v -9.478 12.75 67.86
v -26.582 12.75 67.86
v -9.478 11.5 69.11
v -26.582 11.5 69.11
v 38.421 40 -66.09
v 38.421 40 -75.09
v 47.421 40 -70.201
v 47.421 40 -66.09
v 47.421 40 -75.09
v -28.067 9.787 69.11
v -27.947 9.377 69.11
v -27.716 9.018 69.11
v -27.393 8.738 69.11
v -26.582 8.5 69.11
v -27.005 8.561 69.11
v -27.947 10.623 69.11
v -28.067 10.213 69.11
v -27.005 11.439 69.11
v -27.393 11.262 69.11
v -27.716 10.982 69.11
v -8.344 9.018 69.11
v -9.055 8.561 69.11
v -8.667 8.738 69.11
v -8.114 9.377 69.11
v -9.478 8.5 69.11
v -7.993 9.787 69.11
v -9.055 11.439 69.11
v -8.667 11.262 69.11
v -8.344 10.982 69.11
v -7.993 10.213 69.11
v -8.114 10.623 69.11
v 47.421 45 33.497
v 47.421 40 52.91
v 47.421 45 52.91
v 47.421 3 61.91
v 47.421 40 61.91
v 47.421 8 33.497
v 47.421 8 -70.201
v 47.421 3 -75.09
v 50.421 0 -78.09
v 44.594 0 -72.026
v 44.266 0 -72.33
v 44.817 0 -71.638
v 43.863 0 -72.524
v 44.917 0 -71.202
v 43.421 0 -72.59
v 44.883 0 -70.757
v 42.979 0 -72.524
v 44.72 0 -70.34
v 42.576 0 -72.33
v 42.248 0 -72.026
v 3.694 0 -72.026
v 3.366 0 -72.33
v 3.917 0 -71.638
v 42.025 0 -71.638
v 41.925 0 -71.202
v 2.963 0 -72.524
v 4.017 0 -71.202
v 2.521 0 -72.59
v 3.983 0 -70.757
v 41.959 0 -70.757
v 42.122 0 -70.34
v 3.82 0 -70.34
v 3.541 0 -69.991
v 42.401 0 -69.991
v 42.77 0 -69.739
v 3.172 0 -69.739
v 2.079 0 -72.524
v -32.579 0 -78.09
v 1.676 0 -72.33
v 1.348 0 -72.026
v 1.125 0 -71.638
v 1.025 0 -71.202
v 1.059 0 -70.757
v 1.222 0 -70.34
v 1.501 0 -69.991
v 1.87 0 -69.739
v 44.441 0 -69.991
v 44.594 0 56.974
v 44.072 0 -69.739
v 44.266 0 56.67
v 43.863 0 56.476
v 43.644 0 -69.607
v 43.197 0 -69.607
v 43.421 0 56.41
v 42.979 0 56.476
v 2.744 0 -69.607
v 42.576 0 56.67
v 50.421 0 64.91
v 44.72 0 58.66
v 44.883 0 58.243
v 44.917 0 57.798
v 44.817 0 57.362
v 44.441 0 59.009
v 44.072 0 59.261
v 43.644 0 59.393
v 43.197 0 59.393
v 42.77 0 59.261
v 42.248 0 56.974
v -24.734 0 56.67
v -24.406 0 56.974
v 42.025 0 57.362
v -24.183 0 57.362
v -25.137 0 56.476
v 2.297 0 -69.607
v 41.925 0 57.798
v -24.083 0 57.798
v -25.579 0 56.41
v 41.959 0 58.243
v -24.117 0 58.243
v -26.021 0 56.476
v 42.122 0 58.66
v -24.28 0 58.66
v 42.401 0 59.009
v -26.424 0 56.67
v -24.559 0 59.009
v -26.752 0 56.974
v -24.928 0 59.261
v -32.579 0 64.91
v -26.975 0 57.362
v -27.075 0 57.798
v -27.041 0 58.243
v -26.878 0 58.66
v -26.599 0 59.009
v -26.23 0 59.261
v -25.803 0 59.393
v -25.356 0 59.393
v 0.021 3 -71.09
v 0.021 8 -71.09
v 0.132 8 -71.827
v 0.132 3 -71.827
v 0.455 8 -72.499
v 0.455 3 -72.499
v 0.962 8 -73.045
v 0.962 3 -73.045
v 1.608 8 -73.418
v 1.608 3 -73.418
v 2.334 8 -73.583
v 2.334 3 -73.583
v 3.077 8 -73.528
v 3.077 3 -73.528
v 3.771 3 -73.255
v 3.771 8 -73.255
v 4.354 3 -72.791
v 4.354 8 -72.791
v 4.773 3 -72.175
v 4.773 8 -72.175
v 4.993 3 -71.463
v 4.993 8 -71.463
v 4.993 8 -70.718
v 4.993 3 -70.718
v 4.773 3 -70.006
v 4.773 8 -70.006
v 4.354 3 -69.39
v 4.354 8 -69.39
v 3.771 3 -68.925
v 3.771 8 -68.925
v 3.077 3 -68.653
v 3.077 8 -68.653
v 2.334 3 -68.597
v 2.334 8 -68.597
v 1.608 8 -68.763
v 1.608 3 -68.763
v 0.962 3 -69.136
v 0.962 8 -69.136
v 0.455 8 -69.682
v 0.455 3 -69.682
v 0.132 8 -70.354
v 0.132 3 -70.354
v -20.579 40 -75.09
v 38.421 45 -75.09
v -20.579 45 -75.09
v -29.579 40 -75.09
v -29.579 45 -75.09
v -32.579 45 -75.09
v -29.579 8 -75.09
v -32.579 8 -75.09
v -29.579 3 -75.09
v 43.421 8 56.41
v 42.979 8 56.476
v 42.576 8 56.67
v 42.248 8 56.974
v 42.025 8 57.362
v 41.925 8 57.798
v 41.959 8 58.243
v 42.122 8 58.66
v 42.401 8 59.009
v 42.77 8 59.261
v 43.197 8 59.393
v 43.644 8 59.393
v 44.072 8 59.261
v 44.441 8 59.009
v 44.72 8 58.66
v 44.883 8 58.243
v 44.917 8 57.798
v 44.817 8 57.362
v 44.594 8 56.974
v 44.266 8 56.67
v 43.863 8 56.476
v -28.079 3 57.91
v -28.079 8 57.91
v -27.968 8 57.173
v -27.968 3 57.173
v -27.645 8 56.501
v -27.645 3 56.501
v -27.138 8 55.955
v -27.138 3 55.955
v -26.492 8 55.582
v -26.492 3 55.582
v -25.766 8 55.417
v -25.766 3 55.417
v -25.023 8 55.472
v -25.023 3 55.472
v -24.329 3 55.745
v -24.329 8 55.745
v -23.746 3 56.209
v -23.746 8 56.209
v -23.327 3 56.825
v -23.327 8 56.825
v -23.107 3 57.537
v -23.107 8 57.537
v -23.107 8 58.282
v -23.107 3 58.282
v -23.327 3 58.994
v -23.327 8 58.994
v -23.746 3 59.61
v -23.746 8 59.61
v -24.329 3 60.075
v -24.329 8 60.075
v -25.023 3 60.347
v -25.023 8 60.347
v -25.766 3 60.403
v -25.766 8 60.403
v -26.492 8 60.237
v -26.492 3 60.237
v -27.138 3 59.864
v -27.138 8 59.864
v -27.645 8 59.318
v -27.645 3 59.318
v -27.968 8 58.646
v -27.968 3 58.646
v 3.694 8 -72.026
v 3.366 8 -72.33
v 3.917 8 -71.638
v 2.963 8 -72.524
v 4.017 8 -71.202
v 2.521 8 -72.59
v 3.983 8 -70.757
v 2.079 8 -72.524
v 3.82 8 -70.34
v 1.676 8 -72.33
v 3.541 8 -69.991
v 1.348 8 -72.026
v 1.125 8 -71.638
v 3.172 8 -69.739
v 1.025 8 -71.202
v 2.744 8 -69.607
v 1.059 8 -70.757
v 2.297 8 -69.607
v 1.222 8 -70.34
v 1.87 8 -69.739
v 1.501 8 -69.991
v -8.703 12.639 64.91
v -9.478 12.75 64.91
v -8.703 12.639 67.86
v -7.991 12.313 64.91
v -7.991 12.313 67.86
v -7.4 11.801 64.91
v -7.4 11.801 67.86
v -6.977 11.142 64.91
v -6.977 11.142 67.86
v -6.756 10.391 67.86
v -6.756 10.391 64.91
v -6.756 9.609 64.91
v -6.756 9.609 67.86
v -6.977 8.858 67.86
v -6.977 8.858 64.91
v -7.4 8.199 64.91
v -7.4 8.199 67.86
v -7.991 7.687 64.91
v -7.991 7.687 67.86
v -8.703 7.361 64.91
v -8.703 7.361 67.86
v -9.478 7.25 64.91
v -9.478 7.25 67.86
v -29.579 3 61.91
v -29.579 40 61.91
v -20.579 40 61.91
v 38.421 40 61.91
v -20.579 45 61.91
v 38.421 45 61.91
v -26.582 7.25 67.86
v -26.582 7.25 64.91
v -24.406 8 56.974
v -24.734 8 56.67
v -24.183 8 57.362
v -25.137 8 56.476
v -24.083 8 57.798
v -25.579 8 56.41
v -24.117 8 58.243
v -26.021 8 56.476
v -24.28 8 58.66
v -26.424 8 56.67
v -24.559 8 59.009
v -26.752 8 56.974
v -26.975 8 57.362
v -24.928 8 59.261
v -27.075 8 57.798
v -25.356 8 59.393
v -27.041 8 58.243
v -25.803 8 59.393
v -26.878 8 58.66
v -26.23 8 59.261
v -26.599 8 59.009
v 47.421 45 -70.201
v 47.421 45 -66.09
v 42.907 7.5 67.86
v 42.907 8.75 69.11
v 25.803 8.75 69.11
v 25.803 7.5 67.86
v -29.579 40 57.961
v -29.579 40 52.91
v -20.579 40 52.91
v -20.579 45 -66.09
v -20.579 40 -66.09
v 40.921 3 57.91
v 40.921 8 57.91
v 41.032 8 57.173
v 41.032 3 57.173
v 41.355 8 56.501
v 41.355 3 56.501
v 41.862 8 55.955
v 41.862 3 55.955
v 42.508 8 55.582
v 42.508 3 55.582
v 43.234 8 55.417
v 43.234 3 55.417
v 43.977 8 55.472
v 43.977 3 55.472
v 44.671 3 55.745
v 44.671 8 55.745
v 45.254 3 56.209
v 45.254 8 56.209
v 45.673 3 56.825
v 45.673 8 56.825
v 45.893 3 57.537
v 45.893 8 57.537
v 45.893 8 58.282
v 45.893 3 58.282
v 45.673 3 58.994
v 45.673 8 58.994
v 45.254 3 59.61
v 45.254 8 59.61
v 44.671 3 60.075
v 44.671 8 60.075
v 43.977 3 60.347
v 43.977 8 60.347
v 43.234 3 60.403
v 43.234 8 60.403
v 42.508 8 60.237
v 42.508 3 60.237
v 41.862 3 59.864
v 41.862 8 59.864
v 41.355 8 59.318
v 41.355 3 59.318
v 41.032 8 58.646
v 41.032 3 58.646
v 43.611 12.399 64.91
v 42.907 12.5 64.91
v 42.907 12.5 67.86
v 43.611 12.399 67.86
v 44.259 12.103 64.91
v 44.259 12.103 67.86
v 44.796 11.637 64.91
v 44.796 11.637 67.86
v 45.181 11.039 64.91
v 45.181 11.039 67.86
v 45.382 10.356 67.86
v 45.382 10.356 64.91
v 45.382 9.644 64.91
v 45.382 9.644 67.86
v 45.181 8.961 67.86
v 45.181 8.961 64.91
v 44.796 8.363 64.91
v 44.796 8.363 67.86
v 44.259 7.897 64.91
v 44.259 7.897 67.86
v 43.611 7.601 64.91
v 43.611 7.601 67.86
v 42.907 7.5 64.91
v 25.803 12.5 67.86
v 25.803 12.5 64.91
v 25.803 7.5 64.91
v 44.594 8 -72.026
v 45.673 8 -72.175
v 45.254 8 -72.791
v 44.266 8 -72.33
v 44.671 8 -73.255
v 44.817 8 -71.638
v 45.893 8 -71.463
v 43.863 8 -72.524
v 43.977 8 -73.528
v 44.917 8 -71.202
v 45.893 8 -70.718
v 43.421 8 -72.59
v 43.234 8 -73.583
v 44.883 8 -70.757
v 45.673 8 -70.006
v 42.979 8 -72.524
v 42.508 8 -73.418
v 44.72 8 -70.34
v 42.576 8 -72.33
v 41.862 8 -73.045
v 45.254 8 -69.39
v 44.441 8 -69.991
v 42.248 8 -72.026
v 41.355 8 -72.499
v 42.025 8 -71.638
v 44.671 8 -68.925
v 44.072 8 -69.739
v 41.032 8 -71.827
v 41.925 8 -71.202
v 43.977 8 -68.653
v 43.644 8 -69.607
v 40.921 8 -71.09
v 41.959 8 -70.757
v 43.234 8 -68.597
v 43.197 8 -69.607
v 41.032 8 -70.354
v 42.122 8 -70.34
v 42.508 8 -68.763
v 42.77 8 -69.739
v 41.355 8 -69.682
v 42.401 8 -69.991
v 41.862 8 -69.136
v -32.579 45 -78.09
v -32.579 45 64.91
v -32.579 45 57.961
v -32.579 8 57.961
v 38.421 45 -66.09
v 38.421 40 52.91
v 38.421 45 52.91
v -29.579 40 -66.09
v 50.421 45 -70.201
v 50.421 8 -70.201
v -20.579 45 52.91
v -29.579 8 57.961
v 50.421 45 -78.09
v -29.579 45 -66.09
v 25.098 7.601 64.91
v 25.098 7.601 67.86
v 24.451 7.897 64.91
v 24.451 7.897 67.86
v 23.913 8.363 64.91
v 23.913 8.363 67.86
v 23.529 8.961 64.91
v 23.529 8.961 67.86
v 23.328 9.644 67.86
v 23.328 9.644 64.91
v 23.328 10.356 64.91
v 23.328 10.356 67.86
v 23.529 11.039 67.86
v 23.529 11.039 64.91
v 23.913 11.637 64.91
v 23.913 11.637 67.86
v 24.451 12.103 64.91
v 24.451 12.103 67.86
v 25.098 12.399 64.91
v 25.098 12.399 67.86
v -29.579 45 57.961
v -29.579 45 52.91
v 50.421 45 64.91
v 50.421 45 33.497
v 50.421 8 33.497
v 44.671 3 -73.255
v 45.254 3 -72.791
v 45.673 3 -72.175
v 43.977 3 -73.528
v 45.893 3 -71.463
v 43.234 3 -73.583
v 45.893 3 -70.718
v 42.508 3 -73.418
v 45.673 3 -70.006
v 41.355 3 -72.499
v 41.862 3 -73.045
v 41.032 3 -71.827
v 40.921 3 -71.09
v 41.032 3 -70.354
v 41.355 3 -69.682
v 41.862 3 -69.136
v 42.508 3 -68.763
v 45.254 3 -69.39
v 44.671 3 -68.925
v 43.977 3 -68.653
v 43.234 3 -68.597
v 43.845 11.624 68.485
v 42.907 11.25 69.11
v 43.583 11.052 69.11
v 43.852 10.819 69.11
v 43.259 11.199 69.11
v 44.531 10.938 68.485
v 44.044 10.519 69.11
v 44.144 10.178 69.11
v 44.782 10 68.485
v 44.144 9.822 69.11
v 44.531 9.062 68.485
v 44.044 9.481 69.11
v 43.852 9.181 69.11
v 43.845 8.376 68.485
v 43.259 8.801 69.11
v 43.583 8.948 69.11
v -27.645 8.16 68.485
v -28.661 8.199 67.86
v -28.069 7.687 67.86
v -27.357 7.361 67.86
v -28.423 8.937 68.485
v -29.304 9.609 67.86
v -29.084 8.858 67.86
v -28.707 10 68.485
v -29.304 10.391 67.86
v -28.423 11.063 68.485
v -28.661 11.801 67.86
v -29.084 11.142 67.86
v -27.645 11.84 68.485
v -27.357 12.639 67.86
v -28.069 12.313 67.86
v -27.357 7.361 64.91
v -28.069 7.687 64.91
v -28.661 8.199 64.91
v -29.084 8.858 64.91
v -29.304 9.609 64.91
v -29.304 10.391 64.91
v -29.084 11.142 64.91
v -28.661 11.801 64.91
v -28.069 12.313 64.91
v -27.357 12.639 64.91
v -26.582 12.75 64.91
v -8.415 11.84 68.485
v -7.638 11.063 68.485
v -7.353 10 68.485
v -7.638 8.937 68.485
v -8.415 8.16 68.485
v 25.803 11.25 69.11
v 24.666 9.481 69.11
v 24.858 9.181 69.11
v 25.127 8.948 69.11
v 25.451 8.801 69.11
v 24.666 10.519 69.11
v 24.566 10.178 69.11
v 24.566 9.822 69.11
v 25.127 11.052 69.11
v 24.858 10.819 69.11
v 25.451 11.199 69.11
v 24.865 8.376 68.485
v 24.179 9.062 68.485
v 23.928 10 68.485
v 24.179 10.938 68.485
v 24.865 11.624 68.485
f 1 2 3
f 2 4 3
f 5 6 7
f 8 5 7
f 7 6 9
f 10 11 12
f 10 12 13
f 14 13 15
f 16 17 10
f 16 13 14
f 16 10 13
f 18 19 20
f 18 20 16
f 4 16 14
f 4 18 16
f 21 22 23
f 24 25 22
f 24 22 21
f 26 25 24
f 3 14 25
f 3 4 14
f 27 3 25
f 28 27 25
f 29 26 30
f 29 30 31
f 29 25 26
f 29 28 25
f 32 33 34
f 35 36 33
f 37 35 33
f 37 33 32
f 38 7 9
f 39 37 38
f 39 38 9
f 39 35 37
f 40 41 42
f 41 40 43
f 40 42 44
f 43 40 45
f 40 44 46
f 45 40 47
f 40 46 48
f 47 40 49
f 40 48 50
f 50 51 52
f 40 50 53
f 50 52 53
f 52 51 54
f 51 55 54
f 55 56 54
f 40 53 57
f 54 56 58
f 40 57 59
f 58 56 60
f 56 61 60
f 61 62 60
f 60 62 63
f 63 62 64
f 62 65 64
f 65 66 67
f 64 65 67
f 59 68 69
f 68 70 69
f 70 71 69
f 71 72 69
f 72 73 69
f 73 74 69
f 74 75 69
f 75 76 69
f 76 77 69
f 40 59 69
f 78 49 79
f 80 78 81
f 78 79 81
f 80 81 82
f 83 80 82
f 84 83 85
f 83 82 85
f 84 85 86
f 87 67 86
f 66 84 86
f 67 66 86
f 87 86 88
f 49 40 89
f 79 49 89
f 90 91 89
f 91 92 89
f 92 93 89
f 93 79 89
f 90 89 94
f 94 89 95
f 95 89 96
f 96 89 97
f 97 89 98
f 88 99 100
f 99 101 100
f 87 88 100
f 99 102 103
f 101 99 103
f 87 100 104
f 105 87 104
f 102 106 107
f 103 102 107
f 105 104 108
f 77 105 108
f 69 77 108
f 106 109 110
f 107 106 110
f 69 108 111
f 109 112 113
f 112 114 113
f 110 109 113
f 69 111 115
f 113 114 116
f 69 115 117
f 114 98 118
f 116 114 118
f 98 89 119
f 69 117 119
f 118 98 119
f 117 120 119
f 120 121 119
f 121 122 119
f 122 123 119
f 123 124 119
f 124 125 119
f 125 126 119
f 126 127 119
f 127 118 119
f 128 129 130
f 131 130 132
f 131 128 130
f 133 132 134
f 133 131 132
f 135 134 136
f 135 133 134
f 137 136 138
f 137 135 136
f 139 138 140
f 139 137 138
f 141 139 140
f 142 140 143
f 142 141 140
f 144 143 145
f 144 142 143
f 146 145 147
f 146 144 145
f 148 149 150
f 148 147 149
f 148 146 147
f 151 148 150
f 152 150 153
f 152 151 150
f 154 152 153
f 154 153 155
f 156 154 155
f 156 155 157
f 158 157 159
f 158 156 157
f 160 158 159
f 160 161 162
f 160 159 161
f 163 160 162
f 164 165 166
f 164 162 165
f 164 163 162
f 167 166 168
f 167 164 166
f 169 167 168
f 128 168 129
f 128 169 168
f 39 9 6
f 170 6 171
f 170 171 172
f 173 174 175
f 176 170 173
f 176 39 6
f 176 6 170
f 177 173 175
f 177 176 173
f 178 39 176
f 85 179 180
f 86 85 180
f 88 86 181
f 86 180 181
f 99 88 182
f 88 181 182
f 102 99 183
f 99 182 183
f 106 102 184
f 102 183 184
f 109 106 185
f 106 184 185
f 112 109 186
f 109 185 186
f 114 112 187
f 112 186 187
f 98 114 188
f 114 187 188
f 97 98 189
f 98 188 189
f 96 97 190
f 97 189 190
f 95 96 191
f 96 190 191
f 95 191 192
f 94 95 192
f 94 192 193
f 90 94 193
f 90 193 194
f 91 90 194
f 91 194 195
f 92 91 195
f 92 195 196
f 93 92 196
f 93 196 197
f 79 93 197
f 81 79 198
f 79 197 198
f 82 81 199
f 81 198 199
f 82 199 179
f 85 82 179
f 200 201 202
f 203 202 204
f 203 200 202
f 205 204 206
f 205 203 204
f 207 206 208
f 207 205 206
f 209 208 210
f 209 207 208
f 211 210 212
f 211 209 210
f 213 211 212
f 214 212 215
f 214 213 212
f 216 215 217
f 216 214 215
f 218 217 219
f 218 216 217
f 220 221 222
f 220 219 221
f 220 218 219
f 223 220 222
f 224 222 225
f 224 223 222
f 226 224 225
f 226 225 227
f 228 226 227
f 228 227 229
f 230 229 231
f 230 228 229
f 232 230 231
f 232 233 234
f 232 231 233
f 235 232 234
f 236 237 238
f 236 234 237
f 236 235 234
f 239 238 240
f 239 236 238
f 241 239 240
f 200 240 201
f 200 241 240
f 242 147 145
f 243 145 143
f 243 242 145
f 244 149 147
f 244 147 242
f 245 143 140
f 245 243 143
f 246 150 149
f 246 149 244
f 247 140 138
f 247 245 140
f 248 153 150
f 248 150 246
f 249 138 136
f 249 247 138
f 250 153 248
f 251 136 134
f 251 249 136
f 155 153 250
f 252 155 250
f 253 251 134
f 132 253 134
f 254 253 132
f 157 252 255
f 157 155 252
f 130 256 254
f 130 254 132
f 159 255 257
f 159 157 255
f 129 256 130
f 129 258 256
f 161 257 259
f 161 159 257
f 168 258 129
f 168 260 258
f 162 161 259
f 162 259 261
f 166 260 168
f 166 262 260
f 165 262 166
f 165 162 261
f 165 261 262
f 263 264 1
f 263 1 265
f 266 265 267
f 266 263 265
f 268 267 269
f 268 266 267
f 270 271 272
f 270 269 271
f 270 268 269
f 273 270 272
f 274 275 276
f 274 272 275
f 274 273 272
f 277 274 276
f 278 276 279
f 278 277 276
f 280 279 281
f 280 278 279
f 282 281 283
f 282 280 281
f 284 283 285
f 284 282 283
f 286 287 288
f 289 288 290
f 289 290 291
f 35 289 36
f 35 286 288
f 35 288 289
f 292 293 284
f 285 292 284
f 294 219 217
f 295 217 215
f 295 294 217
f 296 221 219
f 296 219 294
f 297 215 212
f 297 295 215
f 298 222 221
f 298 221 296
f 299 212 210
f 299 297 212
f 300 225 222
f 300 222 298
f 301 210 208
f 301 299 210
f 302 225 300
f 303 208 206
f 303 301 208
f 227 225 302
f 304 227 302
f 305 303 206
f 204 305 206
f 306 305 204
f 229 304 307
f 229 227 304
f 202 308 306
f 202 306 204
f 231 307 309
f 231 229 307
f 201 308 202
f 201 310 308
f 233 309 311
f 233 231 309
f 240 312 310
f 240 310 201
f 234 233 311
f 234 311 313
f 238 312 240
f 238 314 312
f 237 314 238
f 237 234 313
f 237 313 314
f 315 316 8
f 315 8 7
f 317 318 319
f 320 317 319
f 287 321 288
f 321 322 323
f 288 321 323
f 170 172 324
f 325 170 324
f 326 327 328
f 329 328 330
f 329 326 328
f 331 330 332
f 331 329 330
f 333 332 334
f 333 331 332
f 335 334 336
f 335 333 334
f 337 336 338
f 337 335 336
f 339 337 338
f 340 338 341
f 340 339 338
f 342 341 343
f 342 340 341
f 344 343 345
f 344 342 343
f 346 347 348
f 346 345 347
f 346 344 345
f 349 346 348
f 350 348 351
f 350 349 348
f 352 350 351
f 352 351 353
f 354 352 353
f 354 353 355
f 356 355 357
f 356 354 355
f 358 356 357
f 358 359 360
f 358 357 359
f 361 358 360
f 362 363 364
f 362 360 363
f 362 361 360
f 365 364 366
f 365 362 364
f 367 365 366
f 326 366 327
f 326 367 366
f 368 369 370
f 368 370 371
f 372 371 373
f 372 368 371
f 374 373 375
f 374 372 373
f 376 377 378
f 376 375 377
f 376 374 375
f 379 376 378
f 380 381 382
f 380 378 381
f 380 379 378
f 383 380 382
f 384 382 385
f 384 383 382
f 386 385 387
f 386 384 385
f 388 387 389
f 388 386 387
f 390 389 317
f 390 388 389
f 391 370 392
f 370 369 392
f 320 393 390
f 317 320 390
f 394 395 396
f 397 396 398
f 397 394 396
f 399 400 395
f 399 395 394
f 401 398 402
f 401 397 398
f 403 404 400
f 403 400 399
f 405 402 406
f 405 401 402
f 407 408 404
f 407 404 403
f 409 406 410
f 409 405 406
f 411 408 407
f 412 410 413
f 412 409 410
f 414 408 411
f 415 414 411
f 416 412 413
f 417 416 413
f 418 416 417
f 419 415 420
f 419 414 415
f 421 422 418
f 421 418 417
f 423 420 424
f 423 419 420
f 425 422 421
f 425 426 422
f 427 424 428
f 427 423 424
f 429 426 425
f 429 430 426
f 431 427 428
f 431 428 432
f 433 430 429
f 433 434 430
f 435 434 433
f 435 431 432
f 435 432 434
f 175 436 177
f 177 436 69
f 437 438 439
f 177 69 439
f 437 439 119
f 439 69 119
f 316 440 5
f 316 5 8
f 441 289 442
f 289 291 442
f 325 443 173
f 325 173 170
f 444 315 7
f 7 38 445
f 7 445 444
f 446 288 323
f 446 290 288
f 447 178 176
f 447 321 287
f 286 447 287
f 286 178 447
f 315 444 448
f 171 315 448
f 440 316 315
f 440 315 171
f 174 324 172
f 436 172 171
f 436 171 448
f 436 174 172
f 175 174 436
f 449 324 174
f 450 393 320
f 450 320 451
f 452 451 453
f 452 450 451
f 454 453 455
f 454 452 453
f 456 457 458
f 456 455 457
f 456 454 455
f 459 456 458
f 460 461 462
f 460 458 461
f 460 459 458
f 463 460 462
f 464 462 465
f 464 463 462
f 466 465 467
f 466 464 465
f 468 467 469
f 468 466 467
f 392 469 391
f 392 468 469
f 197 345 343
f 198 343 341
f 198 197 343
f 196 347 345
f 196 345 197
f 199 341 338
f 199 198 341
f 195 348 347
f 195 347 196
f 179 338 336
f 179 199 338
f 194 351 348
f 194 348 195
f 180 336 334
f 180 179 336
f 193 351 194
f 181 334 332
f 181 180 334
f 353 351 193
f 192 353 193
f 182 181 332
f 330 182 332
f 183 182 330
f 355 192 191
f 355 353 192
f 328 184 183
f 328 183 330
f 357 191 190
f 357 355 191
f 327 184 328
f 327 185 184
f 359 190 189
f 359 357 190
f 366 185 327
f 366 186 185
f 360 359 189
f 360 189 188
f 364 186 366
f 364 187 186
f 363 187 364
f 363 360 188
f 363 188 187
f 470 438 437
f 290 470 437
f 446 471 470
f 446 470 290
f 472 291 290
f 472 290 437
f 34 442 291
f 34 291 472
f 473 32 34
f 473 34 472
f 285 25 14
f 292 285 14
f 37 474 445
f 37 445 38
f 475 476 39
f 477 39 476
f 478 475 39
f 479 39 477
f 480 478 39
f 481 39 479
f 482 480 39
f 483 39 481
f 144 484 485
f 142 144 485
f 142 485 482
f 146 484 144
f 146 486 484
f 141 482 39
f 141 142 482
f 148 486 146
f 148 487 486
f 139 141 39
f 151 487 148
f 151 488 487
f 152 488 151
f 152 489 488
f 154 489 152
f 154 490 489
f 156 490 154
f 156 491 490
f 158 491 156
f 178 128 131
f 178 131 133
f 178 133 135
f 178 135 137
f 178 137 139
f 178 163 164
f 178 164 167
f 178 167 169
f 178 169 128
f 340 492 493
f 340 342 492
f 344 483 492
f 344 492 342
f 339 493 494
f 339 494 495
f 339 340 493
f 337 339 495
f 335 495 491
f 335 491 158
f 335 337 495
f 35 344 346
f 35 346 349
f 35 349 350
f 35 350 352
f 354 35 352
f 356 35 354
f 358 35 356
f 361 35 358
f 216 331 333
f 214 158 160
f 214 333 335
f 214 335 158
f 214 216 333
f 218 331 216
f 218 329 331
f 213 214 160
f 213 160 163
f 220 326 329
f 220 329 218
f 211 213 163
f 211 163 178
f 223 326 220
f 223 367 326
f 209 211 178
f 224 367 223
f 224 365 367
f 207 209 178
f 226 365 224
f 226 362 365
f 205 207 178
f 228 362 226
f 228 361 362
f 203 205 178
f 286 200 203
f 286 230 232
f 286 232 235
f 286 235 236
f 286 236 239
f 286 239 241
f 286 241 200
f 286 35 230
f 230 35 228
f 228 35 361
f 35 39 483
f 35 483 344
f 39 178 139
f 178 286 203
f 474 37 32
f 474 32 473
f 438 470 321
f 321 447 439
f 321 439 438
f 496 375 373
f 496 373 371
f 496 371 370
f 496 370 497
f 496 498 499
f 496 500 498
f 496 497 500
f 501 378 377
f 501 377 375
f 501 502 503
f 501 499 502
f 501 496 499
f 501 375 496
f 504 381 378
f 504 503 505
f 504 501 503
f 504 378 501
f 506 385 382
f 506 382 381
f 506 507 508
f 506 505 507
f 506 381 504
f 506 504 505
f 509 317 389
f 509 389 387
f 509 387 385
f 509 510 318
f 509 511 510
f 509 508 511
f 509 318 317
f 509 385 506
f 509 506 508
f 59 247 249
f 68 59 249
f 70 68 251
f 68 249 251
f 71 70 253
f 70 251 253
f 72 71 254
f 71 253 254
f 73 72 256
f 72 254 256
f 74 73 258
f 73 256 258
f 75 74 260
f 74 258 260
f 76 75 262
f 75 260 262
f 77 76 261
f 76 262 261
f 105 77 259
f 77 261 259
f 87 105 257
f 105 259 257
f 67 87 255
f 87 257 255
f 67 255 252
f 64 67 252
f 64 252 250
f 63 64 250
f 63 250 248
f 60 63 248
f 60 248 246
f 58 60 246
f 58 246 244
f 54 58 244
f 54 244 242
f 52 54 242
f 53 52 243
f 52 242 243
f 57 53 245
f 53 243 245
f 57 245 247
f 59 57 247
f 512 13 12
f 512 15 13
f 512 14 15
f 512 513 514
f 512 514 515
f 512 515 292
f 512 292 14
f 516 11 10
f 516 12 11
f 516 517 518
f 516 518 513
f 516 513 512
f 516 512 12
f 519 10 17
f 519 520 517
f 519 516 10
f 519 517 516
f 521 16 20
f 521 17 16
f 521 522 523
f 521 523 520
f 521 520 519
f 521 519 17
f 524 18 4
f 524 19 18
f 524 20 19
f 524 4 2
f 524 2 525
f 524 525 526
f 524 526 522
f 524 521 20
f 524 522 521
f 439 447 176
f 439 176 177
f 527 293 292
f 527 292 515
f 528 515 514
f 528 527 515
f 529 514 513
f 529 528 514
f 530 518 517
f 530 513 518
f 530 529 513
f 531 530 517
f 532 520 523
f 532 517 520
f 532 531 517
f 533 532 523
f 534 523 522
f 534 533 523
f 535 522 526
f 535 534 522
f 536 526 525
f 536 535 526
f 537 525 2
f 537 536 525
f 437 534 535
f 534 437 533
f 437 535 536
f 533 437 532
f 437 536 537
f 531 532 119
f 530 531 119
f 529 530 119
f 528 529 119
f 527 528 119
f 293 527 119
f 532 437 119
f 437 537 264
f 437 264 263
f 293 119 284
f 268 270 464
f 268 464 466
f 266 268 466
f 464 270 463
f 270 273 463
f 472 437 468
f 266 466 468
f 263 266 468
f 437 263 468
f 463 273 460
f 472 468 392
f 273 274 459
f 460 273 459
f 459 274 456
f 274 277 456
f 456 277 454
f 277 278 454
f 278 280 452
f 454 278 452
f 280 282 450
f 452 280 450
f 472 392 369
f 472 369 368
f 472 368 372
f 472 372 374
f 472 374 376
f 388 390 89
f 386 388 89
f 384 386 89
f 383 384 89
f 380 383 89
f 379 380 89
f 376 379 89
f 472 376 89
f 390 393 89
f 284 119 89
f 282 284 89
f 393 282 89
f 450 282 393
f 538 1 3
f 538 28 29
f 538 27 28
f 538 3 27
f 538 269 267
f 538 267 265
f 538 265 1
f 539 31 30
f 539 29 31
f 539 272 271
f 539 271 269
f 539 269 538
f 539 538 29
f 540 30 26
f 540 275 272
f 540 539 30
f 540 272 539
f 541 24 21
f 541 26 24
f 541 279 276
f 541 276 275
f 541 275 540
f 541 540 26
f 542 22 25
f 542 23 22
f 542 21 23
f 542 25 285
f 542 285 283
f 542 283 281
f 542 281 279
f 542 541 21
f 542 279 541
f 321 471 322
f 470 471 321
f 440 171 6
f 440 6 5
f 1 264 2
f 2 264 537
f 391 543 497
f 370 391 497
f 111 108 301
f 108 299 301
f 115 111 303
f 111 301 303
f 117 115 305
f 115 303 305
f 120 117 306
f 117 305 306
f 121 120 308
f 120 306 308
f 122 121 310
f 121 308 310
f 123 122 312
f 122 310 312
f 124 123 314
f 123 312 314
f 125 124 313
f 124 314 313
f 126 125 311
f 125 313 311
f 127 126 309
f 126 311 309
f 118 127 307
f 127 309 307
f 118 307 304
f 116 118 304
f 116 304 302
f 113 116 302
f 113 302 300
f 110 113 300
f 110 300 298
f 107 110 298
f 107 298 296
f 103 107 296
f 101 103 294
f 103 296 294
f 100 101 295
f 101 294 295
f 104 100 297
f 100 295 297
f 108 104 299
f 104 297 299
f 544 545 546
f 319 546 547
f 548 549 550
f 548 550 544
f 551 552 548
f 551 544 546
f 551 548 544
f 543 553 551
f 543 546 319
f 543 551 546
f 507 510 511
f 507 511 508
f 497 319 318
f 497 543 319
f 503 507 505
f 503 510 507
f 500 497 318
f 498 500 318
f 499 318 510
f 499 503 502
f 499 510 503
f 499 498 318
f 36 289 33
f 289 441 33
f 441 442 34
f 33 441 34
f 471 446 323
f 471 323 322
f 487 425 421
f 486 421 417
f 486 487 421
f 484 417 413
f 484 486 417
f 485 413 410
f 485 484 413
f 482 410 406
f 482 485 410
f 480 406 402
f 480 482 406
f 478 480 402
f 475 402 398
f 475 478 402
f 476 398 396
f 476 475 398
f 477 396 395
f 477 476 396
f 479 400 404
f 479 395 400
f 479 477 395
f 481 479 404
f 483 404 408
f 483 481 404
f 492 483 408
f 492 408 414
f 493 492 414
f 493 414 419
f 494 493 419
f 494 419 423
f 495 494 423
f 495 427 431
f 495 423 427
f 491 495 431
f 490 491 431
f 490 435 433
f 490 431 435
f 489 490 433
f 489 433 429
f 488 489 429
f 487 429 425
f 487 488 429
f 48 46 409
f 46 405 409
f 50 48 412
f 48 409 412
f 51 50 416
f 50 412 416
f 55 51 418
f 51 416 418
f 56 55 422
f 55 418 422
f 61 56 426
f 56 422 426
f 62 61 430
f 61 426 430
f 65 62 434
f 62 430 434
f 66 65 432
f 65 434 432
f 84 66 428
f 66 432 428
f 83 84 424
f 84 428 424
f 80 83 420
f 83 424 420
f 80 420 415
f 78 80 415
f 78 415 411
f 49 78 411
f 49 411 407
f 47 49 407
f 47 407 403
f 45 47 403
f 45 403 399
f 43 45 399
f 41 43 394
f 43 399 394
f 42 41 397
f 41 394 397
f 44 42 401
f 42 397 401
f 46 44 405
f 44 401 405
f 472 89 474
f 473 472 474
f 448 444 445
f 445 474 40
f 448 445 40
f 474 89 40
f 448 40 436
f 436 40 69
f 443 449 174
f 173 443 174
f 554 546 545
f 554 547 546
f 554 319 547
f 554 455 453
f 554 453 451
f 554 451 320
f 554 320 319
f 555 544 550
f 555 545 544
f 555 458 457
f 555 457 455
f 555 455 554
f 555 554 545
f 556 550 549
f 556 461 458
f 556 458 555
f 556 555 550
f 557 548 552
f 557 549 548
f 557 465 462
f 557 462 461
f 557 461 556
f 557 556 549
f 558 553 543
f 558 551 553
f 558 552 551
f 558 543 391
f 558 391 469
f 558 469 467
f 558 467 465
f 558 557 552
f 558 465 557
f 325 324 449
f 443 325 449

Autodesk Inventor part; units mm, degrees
ref_plane "YZ Plane" through (0, 0, 0) normal (1, 0, 0) x (0, 1, 0)
ref_plane "XZ Plane" through (0, 0, 0) normal (0, 1, 0) x (-1, 0, 0)
ref_plane "XY Plane" through (0, 0, 0) normal (0, 0, 1) x (1, 0, 0)
sketch "Sketch1" plane through (0, 0, 0) normal (0, 1, 0) x (-1, 0, 0)
  line L0 (32.5791, 64.9096) -> (-50.4209, 64.9096)
  line L1 (-50.4209, 64.9096) -> (-50.4209, -78.0904)
  line L2 (-50.4209, -78.0904) -> (32.5791, -78.0904)
  line L3 (32.5791, -78.0904) -> (32.5791, 64.9096)
  line L4 (29.5791, 61.9096) -> (-47.4209, 61.9096)
  line L5 (-47.4209, 61.9096) -> (-47.4209, -75.0904)
  line L6 (-47.4209, -75.0904) -> (29.5791, -75.0904)
  line L7 (29.5791, -75.0904) -> (29.5791, 61.9096)
  line L8 (29.5791, -75.0904) -> (29.5791, -78.0904)
  line L9 (-47.4209, -70.2006) -> (-50.4209, -70.2006)
  line L10 (-47.4209, 33.4969) -> (-50.4209, 33.4969)
  line L11 (29.5791, 57.9608) -> (32.5791, 57.9608)
  line L12 (29.5791, -75.0904) -> (32.5791, -75.0904)
  point P0 (0, 0)
  dimension "d0" = 143
  dimension "d1" = 83
  dimension "d2" = 3
extrude "Floor" add sketch "Sketch1" along normal blind 3
extrude "Walls" add sketch "Sketch1" along normal blind 20 contours L3 L11 L7 L4 L5 L10 L1 L0 | L3 L12 L7 L11 | L10 L5 L9 L1 | L3 L2 L8 L12 | L9 L5 L6 L8 L2 L1
sketch "Sketch2" plane through (0, 0, 0) normal (0, 1, 0) x (-1, 0, 0)
  line L0 (-47.4209, 61.9096) -> (29.5791, 61.9096) projected
  line L1 (29.5791, -75.0904) -> (-47.4209, -75.0904) projected
  line L2 (29.5791, 61.9096) -> (29.5791, -75.0904) projected
  line L3 (-47.4209, -75.0904) -> (-47.4209, 61.9096) projected
  circle A0 centre (25.5791, 57.9096) radius 2.5
  circle A1 centre (-43.4209, 57.9096) radius 2.5
  circle A2 centre (-43.4209, -71.0904) radius 2.5
  circle A3 centre (-2.5209, -71.0904) radius 2.5
  line L4 (-47.4209, 61.9096) -> (-47.4209, -75.0904) projected
  line L5 (-47.4209, -68.5904) -> (-50.4209, -68.5904)
  line L6 (-50.4209, -68.5904) -> (-50.4209, 27.9367)
  line L7 (-50.4209, 64.9096) -> (-50.4209, -78.0904) projected
  line L8 (-47.4209, 27.9367) -> (-50.4209, 27.9367)
  line L9 (29.5791, -75.0904) -> (29.5791, 61.9096) projected
  line L10 (29.5791, 55.4096) -> (32.4454, 55.4096)
  line L11 (-47.4209, -75.0904) -> (29.5791, -75.0904) projected
  line L12 (29.5791, -75.0904) -> (29.5791, -78.0904)
  point P0 (0, 0)
  dimension "d30" = 4
  dimension "d31" = 4
  dimension "d32" = 4
  dimension "d33" = 4
  dimension "d34" = 4
  dimension "d35" = 4
  dimension "d36" = 4
  dimension "d37" = 32.1
extrude "mounts" add sketch "Sketch2" along normal blind 8 contours A0 | A1 | A2 | A3
hole "Hole1" at (43.4209, 0, -71.0904) at (43.4209, 0, 57.9096) at (2.5209, 0, -71.0904) at (-25.5791, 0, 57.9096) direction (0, 1, 0) diameter 3 depth 8
extrude "Extrusion5" cut sketch "Sketch1" along normal blind 20 contours L10 L5 L9 L1
extrude "Extrusion6" cut sketch "Sketch1" along normal blind 20 contours L3 L12 L7 L11 | L3 L2 L8 L12
extrude "Extrusion7" add sketch "Sketch1" along normal blind 8 contours L10 L5 L9 L1
extrude "Extrusion8" add sketch "Sketch1" along normal blind 8 contours L3 L12 L7 L11 | L3 L2 L8 L12
sketch "Sketch3" plane through (-32.5791, 0, 64.9096) normal (0, 0, 1) x (1, 0, 0)
  line L0 (0, 0) -> (0, 20) construction
  line L1 (0, 10) -> (97.9753, 10) construction
  line L2 (0, 20) -> (83, 20) construction
  line L3 (5.9967, 10) -> (23.1011, 10) construction
  line L4 (5.9967, 7.25) -> (23.1011, 7.25)
  line L5 (23.1011, 12.75) -> (5.9967, 12.75)
  arc A0 (5.9967, 12.75) -> (5.9967, 7.25) centre (5.9967, 10) ccw
  arc A1 (23.1011, 7.25) -> (23.1011, 12.75) centre (23.1011, 10) ccw
  line L6 (75.4862, 10) -> (58.3819, 10) construction
  line L7 (75.4862, 12.5) -> (58.3819, 12.5)
  line L8 (58.3819, 7.5) -> (75.4862, 7.5)
  arc A2 (75.4862, 7.5) -> (75.4862, 12.5) centre (75.4862, 10) ccw
  arc A3 (58.3819, 12.5) -> (58.3819, 7.5) centre (58.3819, 10) ccw
  line L9 (0, 0) -> (83, 0) projected
  point P0 (32.5791, 0)
  point P1 (14.5489, 10)
  point P2 (66.9341, 10)
  point P3 (40.0449, 10)
  dimension "d59" = 5.5
  dimension "d60" = 5
  dimension "d80" = 10
  dimension "d81" = 10
extrude "Extrusion9" add sketch "Sketch3" along normal blind 4.2
chamfer "Chamfer1" distance 1.25 angle 45 8 edges at (-6.7281, 10, 69.1096) (-18.0302, 12.75, 69.1096) (-29.3324, 10, 69.1096) (-18.0302, 7.25, 69.1096) (45.4071, 10, 69.1096) (34.3549, 12.5, 69.1096) (23.3027, 10, 69.1096) (34.3549, 7.5, 69.1096)
hole "Hole2" at (8.9209, 10, 64.9096) direction (0, 0, 1) diameter 4 depth 3
extrude "Extrusion10" add sketch "Sketch1" along normal blind 45 contours L3 L11 L7 L4 L5 L10 L1 L0
extrude "Extrusion11" add sketch "Sketch1" along normal blind 45 contours L9 L5 L6 L8 L2 L1
extrude "Extrusion12" add sketch "Sketch1" along normal blind 45 contours L3 L2 L8 L12
ref_plane "Work Plane1" through (47.4209, 45, -75.0904) normal (0, 1, 0) x (1, 0, 0)
sketch "Sketch4" plane through (0, 45, 0) normal (0, 1, 0) x (1, 0, 0)
  line L0 (47.4209, -61.9096) -> (47.4209, 75.0904) projected
  line L1 (47.4209, -61.9096) -> (38.4209, -61.9096)
  line L2 (38.4209, -61.9096) -> (38.4209, -52.9096)
  line L3 (38.4209, -52.9096) -> (47.4209, -52.9096)
  line L4 (47.4209, -52.9096) -> (47.4209, -61.9096)
  line L5 (47.4209, -61.9096) -> (-29.5791, -61.9096) projected
  line L6 (-29.5791, -61.9096) -> (-20.5791, -61.9096)
  line L7 (-20.5791, -61.9096) -> (-20.5791, -52.9096)
  line L8 (-20.5791, -52.9096) -> (-29.5791, -52.9096)
  line L9 (-29.5791, -52.9096) -> (-29.5791, -61.9096)
  line L10 (47.4209, 75.0904) -> (-29.5791, 75.0904) projected
  line L11 (47.4209, 75.0904) -> (38.4209, 75.0904)
  line L12 (38.4209, 75.0904) -> (38.4209, 66.0904)
  line L13 (38.4209, 66.0904) -> (47.4209, 66.0904)
  line L14 (47.4209, 66.0904) -> (47.4209, 75.0904)
  line L15 (-29.5791, 75.0904) -> (-20.5791, 75.0904)
  line L16 (-20.5791, 75.0904) -> (-20.5791, 66.0904)
  line L17 (-20.5791, 66.0904) -> (-29.5791, 66.0904)
  line L18 (-29.5791, 66.0904) -> (-29.5791, 75.0904)
  line L19 (-32.5791, 75.0904) -> (47.4209, 75.0904) projected
  point P0 (0, 0)
  dimension "d84" = 9
  dimension "d85" = 9
  dimension "d86" = 9
  dimension "d87" = 9
  dimension "d88" = 9
  dimension "d89" = 9
  dimension "d90" = 9
extrude "Extrusion13" add sketch "Sketch4" against normal blind 5 contours L5 L9 L8 L7
extrude "Extrusion14" add sketch "Sketch4" against normal blind 5 contours L1 L2 L3 L0 | L13 L12 L10 L0 | L16 L17 L18 L10
properties part number "rumba_frame_mount"
